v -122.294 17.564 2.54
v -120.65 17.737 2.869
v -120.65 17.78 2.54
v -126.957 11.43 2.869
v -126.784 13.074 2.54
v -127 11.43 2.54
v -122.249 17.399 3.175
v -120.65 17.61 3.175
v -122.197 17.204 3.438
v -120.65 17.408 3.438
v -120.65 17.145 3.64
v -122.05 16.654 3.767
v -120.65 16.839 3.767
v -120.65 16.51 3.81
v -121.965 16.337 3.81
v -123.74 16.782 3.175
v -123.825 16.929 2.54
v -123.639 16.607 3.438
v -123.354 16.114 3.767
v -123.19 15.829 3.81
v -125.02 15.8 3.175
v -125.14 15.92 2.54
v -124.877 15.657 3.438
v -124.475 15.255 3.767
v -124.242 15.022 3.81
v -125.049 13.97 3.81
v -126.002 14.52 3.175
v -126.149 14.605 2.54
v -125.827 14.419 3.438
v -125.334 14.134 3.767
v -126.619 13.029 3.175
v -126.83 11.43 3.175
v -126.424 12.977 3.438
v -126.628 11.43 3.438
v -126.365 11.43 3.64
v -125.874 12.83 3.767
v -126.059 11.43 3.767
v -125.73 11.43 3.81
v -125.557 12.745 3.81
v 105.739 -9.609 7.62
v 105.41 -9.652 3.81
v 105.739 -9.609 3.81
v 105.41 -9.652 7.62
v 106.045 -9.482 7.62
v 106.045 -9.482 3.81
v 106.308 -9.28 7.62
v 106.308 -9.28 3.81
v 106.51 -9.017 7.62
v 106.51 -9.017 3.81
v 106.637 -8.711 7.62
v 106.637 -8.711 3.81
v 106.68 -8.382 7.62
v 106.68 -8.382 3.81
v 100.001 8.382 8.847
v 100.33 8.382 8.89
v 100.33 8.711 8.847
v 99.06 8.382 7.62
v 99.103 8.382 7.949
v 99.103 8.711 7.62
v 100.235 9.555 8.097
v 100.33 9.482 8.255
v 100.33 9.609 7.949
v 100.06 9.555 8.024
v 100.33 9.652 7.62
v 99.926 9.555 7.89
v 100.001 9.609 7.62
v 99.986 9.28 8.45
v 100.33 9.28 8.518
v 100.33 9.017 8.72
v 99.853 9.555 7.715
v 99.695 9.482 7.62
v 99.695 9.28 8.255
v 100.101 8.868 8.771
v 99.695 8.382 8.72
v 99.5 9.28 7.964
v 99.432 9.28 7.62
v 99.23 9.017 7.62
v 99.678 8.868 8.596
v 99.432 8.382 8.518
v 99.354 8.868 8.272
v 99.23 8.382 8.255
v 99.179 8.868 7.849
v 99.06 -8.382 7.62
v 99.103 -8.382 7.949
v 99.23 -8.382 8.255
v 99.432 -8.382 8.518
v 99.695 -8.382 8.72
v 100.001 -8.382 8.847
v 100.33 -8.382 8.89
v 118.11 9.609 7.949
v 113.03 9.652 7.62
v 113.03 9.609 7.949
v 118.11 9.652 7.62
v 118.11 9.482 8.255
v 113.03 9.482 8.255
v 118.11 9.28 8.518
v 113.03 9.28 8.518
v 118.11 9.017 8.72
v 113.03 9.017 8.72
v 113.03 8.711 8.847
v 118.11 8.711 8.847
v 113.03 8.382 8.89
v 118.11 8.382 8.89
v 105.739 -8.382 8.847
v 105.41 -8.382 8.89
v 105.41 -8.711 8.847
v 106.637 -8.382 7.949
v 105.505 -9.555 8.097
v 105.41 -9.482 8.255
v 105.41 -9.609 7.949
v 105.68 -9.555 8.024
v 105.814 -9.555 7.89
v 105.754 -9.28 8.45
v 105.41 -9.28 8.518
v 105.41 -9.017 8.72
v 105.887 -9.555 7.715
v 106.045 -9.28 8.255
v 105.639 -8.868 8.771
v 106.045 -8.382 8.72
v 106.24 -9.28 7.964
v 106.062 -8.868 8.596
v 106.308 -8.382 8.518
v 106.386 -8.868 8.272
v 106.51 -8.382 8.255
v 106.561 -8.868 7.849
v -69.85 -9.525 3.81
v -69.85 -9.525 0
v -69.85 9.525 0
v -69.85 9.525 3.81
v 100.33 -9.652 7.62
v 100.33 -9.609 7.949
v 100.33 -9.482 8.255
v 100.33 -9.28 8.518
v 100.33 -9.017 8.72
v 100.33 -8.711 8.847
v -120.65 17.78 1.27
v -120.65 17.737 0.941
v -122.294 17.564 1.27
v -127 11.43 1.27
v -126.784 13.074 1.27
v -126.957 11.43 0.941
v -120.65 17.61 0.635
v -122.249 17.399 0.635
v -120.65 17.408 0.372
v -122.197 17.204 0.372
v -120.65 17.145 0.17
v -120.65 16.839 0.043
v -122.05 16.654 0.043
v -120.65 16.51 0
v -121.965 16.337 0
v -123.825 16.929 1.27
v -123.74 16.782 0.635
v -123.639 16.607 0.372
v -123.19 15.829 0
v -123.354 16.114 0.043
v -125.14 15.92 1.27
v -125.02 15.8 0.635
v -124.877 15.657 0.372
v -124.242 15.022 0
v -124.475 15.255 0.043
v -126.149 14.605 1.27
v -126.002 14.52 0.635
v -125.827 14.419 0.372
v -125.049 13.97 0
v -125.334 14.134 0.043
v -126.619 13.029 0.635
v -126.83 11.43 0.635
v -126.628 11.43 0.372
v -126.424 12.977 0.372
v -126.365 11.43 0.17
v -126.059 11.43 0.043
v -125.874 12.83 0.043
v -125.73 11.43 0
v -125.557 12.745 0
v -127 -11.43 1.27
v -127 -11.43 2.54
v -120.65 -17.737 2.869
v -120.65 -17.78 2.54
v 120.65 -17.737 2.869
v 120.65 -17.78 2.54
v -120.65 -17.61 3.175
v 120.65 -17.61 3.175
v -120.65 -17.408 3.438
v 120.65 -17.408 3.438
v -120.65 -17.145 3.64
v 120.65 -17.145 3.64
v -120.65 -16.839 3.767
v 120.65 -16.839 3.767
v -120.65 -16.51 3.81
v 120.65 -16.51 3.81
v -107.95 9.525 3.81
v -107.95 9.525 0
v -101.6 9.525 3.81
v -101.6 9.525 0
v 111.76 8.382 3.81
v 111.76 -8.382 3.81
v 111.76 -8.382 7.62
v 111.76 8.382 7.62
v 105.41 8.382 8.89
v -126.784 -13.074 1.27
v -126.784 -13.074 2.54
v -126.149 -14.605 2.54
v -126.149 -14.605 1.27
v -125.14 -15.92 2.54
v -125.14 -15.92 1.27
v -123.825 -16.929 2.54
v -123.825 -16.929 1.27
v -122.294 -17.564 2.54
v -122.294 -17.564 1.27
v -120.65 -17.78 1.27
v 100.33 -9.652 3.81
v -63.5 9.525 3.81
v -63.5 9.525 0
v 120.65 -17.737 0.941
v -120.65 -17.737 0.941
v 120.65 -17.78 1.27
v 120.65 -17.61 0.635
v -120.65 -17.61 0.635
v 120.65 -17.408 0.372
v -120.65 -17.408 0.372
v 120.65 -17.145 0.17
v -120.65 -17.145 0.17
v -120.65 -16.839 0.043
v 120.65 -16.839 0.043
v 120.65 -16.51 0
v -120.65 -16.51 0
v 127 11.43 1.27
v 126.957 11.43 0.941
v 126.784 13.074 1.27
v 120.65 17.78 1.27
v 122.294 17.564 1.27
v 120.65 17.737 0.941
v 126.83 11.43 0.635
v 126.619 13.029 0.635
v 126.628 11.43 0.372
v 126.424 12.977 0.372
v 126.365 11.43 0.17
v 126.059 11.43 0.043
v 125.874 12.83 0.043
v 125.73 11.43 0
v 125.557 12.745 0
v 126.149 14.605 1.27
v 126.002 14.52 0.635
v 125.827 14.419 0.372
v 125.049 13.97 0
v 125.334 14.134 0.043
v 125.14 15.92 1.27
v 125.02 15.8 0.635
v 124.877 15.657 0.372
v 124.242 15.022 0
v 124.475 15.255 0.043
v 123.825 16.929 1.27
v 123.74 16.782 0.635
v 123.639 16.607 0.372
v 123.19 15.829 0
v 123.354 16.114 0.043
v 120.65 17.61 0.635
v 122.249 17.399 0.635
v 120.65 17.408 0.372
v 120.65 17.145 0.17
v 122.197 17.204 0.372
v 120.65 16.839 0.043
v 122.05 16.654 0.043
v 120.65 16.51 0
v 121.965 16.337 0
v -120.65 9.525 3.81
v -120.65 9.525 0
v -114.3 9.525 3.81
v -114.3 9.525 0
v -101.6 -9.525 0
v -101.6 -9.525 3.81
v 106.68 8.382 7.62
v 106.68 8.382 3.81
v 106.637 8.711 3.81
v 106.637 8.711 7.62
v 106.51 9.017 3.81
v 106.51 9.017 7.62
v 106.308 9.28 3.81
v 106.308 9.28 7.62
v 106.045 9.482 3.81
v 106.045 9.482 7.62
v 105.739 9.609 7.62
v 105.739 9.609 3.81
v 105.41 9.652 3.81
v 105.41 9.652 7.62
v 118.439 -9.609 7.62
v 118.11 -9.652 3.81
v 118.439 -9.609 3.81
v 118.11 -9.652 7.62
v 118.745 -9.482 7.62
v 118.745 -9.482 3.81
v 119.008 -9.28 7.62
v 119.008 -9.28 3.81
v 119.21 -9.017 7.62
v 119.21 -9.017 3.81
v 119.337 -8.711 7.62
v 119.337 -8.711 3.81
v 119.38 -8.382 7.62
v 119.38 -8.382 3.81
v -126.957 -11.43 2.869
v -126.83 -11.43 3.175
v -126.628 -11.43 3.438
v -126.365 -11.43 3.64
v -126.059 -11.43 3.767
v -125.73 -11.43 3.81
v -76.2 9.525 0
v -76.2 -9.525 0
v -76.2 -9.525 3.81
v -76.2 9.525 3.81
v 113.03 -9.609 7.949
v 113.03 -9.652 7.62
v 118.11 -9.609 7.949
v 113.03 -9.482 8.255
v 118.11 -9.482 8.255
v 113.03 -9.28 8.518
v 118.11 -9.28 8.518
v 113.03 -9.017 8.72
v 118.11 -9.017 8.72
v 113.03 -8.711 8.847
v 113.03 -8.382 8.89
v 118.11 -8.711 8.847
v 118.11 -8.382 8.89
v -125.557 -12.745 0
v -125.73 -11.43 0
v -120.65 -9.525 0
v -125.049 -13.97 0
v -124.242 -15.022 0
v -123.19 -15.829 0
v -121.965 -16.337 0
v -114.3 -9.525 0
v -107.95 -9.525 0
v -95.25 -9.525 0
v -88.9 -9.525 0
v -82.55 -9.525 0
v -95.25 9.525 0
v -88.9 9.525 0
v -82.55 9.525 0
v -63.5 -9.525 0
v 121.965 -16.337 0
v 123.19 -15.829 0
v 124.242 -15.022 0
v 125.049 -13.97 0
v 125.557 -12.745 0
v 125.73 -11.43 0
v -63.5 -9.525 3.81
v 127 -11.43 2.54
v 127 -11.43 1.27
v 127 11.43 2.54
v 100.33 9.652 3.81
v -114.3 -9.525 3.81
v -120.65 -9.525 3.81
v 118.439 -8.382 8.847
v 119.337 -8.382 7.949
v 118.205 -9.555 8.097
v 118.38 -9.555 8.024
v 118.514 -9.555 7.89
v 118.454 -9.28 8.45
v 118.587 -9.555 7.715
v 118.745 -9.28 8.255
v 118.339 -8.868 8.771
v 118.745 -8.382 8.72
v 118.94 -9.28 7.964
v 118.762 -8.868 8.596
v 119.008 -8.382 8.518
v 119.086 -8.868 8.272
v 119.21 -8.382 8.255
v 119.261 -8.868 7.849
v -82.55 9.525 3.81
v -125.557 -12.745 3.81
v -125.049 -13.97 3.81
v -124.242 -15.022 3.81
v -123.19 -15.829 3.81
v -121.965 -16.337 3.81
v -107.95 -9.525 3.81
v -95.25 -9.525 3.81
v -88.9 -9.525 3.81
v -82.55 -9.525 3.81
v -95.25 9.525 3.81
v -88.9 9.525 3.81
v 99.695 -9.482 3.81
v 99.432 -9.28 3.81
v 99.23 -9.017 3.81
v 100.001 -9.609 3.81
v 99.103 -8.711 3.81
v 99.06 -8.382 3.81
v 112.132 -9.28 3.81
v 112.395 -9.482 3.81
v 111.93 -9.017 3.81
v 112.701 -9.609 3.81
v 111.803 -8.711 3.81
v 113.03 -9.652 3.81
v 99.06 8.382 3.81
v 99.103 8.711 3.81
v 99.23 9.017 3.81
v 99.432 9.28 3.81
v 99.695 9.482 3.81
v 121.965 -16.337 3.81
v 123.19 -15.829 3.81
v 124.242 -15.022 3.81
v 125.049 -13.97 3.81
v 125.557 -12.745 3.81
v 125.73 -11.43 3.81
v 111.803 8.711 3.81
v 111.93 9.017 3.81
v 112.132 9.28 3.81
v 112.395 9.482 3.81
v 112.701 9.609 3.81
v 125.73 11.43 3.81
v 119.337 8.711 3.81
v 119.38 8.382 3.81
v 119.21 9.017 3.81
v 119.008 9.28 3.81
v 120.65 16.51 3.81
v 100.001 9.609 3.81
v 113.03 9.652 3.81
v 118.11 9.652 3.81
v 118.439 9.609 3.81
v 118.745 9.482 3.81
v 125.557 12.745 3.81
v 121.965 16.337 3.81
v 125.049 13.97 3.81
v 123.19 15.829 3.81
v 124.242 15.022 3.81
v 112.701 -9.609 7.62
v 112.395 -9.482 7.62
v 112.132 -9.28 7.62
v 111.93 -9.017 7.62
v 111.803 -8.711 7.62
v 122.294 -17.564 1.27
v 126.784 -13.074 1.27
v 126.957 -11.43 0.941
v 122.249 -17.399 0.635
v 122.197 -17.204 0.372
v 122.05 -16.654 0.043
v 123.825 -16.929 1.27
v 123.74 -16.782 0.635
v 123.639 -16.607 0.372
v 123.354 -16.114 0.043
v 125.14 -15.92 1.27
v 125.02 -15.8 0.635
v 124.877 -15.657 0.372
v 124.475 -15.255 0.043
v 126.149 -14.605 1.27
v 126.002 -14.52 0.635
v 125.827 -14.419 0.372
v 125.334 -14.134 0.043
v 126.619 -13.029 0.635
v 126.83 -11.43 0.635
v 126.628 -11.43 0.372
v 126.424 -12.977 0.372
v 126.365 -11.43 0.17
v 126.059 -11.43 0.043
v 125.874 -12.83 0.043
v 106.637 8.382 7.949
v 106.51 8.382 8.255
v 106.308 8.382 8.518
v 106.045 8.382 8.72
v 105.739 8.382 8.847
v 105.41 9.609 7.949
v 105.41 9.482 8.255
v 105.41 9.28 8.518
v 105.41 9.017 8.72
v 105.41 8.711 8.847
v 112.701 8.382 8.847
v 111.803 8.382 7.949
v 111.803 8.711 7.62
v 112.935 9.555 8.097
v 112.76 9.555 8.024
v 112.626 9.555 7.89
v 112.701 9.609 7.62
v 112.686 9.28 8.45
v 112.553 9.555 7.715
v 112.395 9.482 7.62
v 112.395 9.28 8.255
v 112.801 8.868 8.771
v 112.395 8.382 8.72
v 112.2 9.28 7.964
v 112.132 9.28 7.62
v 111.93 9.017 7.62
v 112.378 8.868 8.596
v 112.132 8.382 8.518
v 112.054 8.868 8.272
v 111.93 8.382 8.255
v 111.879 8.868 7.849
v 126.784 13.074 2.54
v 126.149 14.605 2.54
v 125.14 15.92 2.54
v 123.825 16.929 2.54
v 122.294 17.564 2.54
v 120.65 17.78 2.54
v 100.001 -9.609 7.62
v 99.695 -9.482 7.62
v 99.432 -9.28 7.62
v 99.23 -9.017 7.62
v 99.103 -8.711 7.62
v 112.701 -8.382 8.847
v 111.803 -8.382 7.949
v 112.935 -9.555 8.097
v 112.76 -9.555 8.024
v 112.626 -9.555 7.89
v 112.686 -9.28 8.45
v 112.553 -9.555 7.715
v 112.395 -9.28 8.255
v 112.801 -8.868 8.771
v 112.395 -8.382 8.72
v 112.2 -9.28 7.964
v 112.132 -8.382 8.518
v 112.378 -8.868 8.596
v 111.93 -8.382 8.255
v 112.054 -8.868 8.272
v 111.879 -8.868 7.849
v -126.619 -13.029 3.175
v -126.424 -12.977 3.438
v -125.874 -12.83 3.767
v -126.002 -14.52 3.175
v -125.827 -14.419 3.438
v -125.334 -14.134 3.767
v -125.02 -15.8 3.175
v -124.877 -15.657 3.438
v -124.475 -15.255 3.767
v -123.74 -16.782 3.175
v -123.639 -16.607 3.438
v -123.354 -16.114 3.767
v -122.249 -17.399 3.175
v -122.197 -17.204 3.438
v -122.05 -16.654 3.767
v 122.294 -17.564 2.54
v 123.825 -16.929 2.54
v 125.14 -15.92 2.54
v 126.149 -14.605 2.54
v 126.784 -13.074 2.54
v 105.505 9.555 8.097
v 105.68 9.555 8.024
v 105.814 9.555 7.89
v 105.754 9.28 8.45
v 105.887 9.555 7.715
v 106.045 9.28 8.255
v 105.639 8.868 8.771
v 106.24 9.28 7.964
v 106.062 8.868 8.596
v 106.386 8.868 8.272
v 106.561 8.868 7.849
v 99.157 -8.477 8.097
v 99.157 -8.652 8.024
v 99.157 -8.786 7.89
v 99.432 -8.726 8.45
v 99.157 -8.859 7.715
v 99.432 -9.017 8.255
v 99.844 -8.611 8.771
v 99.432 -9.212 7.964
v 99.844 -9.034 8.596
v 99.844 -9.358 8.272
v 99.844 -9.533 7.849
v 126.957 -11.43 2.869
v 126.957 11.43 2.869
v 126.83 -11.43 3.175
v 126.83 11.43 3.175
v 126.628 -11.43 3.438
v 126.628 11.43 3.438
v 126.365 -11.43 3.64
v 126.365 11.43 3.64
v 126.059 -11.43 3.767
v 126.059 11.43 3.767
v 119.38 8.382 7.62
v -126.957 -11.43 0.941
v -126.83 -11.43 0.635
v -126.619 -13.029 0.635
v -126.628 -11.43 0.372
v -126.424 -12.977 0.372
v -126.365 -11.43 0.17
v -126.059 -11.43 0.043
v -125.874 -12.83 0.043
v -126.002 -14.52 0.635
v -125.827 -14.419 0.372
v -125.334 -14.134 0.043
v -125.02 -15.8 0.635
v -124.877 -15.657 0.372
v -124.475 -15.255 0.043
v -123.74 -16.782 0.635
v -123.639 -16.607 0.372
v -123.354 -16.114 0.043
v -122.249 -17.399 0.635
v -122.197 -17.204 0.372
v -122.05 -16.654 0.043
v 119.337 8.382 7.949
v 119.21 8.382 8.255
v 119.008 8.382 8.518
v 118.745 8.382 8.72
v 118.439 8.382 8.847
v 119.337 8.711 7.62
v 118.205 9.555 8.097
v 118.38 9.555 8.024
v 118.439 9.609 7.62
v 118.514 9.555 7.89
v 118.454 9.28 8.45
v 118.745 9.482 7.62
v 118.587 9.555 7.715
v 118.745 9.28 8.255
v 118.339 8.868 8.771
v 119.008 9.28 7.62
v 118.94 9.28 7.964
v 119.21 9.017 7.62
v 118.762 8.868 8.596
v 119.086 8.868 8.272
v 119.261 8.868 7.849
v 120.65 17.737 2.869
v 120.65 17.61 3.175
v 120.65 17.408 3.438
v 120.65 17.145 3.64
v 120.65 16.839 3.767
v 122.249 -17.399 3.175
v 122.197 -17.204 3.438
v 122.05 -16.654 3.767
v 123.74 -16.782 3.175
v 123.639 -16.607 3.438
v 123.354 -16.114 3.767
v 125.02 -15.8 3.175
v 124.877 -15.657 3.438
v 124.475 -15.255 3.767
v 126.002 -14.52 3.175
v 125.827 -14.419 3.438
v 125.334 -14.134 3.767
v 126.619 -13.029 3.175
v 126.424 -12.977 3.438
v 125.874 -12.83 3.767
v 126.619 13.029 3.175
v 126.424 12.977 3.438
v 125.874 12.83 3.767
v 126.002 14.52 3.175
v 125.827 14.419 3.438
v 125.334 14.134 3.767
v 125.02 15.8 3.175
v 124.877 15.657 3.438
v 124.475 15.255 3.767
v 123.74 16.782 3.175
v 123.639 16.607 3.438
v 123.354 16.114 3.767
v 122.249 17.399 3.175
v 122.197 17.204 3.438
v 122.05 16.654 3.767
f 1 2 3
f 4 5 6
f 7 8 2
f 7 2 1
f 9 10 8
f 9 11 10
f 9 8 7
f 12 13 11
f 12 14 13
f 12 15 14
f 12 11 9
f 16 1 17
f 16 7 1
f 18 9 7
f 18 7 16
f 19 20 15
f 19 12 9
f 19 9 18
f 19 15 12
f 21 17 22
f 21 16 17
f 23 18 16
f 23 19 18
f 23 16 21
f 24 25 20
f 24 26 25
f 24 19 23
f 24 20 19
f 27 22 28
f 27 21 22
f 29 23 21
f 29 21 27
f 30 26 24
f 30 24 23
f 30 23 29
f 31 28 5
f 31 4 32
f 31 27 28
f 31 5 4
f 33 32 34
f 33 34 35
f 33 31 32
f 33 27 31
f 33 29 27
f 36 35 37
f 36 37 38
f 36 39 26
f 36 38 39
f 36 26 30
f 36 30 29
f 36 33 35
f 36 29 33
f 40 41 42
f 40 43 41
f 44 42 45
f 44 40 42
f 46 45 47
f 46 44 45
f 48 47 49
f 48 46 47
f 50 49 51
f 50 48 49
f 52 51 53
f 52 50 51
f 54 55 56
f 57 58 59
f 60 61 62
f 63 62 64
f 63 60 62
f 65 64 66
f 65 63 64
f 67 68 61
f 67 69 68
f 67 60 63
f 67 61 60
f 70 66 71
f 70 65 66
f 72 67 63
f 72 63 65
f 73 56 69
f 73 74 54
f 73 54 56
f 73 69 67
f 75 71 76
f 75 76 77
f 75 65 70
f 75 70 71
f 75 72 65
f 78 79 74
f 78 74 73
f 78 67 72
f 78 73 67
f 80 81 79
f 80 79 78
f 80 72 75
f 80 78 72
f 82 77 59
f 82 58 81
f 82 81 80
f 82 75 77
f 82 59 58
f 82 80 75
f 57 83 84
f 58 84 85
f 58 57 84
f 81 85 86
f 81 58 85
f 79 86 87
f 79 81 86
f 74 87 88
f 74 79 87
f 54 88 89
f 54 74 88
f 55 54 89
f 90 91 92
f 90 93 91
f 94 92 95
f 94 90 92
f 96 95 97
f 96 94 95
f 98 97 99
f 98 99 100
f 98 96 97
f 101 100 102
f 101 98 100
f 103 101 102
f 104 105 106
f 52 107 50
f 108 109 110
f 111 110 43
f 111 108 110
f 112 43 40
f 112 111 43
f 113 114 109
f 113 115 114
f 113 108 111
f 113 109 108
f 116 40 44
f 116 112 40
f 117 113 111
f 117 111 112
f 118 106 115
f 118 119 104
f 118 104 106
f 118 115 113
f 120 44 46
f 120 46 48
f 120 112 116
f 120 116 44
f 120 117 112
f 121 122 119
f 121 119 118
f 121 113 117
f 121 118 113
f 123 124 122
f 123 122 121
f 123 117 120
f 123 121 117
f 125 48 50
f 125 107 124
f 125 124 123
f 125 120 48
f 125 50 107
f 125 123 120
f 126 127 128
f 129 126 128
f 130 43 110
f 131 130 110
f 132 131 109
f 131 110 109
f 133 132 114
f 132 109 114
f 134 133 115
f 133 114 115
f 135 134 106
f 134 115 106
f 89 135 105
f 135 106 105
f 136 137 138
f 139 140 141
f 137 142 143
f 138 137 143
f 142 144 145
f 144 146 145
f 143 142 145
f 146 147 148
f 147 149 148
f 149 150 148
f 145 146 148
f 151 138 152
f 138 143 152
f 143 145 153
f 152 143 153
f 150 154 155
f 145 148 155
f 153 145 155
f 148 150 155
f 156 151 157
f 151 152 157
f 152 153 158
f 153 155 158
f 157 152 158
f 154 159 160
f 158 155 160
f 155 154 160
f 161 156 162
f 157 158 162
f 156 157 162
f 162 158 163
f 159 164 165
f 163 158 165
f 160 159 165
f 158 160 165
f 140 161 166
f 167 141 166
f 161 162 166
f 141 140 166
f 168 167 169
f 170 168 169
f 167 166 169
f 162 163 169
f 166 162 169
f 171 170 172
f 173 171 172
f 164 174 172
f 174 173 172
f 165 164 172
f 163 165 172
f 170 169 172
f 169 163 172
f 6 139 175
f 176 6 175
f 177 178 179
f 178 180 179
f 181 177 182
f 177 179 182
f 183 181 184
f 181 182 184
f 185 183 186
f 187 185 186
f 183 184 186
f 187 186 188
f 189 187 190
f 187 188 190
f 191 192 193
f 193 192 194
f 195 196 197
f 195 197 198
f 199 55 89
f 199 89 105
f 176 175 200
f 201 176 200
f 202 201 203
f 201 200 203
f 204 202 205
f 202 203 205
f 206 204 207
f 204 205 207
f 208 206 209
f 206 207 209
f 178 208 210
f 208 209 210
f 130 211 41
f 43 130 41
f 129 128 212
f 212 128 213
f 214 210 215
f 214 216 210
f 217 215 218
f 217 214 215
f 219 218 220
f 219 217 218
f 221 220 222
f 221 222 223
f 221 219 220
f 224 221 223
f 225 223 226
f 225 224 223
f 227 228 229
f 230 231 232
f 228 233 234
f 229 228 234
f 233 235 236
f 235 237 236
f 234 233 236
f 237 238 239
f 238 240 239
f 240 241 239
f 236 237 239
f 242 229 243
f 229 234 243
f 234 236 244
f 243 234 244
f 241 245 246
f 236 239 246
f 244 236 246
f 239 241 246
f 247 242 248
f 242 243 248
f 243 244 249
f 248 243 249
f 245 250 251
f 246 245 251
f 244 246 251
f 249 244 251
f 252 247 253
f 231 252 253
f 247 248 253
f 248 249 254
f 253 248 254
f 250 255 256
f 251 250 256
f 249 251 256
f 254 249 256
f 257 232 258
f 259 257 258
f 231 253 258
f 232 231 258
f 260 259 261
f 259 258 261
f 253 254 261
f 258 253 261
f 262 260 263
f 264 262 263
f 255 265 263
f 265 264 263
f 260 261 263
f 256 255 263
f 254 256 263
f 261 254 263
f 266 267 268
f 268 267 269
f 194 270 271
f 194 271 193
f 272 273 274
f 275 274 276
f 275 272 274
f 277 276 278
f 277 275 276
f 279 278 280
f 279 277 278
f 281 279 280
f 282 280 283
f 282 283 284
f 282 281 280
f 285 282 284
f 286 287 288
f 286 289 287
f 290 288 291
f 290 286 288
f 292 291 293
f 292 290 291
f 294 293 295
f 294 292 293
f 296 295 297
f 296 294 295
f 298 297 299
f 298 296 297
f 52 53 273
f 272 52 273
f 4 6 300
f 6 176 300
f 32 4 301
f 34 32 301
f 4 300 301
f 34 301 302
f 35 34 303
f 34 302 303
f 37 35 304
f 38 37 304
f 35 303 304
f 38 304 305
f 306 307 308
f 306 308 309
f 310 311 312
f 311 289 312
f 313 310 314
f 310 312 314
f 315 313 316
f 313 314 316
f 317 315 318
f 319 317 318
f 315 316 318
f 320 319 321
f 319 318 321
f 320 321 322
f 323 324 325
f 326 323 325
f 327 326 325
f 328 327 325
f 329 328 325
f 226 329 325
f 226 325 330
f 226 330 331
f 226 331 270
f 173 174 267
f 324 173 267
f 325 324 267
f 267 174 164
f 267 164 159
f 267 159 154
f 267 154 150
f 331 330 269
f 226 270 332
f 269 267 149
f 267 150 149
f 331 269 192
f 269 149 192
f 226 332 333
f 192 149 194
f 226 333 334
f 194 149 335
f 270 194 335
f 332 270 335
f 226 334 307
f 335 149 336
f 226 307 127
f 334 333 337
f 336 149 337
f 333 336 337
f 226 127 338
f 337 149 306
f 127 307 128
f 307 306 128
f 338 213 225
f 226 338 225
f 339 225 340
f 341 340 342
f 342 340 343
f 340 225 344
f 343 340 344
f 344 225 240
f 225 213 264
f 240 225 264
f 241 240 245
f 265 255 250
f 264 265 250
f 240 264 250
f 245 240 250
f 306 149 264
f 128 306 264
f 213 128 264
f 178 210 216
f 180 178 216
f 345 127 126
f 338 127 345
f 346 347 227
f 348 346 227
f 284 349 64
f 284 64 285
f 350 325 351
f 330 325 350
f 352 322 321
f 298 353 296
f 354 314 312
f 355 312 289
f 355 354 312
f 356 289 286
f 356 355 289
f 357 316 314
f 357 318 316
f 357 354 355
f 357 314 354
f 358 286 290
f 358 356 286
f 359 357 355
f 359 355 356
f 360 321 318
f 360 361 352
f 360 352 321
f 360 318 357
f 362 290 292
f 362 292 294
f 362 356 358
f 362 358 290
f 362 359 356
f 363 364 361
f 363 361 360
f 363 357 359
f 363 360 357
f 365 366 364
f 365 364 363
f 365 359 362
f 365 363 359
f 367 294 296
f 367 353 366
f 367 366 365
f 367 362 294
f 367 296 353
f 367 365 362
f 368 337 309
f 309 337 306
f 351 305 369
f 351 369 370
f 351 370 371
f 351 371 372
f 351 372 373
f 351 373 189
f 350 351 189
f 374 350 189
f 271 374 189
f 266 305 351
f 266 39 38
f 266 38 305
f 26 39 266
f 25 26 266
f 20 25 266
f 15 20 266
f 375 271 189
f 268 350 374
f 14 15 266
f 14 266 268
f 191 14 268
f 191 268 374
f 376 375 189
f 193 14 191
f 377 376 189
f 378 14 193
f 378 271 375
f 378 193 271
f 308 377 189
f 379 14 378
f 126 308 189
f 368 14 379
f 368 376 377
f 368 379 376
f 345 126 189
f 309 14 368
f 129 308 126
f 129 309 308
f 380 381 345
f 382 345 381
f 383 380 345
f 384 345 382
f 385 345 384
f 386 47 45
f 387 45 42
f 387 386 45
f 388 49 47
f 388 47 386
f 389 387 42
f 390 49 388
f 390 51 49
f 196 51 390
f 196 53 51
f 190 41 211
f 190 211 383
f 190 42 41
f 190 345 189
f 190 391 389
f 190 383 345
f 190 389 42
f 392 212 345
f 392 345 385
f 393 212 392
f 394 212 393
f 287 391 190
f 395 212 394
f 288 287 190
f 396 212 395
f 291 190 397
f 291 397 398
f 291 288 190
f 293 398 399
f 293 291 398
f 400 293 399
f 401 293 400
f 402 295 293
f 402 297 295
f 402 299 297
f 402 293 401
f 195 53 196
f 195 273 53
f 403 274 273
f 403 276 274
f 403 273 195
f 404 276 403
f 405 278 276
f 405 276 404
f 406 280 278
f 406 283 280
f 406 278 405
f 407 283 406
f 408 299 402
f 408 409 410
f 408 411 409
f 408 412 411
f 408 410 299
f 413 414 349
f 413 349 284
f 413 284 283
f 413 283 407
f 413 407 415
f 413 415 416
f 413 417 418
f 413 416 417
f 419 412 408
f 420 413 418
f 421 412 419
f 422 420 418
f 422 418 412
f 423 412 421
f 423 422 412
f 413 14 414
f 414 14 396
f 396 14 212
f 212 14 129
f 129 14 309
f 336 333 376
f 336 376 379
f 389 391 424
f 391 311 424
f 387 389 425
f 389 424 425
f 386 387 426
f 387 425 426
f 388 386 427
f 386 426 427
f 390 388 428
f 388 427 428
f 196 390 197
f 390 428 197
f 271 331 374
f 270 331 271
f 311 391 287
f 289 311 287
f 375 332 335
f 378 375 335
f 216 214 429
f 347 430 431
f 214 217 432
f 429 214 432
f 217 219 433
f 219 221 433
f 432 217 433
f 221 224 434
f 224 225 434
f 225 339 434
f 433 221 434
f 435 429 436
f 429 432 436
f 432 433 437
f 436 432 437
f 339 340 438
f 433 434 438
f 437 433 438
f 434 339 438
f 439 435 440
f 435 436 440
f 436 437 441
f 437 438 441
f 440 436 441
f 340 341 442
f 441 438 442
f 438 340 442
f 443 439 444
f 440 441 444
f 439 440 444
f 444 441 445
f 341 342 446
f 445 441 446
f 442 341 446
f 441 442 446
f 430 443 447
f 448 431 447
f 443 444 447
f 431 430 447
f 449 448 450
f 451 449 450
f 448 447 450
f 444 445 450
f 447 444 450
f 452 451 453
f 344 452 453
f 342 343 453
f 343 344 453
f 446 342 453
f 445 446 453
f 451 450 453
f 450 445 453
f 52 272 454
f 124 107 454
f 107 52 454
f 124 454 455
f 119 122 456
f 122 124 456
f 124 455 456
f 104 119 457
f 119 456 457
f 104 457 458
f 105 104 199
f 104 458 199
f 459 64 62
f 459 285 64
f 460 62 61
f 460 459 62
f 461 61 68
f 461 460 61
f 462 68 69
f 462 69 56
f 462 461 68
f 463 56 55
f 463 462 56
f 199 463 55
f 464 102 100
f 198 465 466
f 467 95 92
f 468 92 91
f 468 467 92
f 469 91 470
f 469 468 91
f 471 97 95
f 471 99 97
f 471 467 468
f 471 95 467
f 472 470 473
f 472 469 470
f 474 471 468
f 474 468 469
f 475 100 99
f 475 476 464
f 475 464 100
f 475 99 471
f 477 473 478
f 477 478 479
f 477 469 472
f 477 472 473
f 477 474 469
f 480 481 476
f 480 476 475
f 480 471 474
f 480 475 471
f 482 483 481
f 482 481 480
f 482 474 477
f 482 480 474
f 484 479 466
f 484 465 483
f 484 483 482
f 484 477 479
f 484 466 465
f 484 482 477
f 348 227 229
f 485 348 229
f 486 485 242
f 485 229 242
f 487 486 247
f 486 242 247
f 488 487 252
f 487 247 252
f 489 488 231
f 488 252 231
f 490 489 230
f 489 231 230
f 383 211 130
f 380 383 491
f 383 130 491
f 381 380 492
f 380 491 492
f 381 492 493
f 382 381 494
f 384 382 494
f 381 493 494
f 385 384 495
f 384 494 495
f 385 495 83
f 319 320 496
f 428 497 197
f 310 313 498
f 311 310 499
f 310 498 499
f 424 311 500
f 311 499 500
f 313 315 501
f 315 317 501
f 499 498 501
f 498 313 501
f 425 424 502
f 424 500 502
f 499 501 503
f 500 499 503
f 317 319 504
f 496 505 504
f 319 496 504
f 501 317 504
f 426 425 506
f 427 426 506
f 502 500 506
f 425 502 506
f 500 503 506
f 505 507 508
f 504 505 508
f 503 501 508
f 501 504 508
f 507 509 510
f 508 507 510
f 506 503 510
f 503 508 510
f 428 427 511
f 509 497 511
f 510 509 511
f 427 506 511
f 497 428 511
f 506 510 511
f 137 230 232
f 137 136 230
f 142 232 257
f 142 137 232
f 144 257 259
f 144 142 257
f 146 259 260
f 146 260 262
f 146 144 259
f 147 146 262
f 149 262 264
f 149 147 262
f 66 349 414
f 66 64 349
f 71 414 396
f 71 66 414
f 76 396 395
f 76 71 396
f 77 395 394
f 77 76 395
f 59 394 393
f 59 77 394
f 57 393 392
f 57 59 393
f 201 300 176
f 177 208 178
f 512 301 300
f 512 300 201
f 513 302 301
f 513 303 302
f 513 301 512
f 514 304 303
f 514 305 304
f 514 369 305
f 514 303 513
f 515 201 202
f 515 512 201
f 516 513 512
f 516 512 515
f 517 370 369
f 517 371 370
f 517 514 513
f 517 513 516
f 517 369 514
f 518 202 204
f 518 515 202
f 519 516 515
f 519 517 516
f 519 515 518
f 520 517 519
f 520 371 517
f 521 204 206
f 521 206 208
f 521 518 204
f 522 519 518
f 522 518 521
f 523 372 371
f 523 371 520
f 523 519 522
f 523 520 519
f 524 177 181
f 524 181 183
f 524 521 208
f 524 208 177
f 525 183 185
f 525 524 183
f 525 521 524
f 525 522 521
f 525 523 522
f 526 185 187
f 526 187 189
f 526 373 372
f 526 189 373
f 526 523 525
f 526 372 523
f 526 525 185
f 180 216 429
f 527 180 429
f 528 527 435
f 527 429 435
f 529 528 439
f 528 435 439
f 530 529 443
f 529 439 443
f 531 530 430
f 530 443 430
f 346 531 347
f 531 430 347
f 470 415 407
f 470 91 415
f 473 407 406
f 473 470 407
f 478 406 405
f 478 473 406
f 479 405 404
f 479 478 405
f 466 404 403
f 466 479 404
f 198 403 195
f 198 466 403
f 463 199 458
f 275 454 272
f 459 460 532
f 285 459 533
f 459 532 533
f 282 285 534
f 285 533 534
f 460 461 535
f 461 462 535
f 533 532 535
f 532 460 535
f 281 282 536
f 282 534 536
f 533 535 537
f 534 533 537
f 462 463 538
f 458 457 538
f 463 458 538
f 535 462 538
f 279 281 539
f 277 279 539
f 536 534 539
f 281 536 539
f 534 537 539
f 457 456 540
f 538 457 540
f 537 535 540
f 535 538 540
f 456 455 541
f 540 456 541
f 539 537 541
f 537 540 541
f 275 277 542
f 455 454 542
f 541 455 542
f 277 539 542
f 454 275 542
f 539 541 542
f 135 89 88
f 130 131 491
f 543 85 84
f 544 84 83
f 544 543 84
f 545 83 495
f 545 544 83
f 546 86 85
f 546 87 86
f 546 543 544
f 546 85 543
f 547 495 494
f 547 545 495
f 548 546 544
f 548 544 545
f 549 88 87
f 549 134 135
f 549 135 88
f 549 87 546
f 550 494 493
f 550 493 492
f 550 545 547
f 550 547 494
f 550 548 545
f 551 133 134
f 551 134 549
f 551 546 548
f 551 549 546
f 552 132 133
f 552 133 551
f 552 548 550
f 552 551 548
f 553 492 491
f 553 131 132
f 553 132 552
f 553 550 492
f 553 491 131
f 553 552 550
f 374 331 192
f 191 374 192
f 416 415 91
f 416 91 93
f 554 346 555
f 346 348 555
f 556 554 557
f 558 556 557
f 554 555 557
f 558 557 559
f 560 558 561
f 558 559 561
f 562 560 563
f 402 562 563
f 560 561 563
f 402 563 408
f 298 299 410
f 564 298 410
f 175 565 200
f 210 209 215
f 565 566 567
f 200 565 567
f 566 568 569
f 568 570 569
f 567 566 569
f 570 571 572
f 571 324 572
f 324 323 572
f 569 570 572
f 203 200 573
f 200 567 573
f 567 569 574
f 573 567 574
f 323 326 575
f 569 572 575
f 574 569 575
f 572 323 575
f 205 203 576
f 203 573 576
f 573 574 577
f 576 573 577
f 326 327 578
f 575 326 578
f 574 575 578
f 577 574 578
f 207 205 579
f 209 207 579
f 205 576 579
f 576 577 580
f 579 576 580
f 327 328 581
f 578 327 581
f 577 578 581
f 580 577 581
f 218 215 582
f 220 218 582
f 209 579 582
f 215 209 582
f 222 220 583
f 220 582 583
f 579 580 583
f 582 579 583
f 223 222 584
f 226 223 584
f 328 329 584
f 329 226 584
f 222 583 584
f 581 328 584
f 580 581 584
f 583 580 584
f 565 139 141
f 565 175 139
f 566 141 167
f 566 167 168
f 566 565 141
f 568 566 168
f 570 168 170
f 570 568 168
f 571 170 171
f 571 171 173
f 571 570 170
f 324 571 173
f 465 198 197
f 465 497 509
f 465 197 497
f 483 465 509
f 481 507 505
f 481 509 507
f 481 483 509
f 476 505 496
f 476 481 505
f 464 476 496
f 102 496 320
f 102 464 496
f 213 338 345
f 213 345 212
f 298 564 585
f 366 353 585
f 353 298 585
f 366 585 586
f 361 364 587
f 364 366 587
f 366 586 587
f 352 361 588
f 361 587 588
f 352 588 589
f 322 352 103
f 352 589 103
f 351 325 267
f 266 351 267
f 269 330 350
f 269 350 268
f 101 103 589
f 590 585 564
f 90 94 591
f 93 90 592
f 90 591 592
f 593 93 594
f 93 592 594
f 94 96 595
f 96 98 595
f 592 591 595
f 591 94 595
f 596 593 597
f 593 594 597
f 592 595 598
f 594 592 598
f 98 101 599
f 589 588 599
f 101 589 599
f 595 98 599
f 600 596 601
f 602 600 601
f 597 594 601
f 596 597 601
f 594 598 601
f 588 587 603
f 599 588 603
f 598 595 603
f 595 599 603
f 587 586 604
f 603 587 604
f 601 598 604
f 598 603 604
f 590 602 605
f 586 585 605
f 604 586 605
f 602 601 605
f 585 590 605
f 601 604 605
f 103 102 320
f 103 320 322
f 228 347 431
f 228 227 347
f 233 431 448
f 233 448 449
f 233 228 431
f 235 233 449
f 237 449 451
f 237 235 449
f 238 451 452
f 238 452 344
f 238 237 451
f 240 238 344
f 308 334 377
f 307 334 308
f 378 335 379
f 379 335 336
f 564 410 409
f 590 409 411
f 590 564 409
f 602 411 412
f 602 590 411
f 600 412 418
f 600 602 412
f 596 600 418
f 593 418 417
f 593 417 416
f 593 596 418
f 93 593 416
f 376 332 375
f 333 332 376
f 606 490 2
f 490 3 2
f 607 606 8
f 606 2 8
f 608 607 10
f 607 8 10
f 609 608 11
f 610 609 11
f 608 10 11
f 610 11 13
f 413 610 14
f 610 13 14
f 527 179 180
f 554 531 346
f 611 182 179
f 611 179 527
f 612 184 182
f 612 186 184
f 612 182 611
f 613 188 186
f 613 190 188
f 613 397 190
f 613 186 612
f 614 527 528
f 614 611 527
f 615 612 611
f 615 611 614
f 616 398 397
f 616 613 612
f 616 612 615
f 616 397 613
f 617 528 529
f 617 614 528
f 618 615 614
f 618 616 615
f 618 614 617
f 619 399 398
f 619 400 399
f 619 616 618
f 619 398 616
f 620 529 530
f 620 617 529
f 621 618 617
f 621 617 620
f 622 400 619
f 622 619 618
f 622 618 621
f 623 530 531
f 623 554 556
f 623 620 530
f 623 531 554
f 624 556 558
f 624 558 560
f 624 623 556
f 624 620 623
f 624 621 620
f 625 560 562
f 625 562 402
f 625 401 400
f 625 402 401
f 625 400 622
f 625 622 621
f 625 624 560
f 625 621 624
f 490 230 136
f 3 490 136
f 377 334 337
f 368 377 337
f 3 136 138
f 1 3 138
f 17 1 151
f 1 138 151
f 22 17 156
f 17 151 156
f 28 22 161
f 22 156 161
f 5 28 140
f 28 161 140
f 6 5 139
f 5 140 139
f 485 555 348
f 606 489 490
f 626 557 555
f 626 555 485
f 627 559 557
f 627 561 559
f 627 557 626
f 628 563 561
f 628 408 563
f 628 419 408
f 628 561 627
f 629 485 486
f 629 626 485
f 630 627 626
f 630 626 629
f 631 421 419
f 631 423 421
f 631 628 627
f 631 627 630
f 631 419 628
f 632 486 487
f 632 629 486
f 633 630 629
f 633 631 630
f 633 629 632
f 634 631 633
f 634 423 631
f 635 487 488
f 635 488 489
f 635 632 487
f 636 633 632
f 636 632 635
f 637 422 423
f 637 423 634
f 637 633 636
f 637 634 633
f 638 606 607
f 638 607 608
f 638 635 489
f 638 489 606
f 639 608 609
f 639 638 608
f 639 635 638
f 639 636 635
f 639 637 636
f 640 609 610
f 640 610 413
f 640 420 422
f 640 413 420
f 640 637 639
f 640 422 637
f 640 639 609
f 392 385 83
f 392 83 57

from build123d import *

# Parameters (mm, degrees)
F0_W     = 6.35
F0_H     = 19.05
F0_R     = 17.5576306553
F1_DEPTH = 3.81
F2_R     = 1.27
F3_W     = 7.62
F3_H     = 19.304
F4_DEPTH = 5.08
F5_R     = 1.27


# Not quite as in the source:
# - a feature names something its author has since deleted; it is built from what else it names


with BuildPart() as f1:
    # F0 (on Top) → F1 (new body)
    with BuildSketch(Plane.XY):
        with BuildLine():
            ThreePointArc((127, 11.43), (125.1401280605, 15.9201280605), (120.65, 17.78))
            Line((120.65, 17.78), (-120.65, 17.78))
            ThreePointArc((-120.65, 17.78), (-125.1401280605, 15.9201280605), (-127, 11.43))
            Line((-127, 11.43), (-127, -11.43))
            ThreePointArc((-127, -11.43), (-125.1401280605, -15.9201280605), (-120.65, -17.78))
            Line((-120.65, -17.78), (120.65, -17.78))
            ThreePointArc((120.65, -17.78), (125.1401280605, -15.9201280605), (127, -11.43))
            Line((127, -11.43), (127, 11.43))
        make_face()
        with Locations((-117.475, 0)):
            Rectangle(F0_W, F0_H, mode=Mode.SUBTRACT)
        with Locations((-104.775, 0)):
            Rectangle(F0_W, F0_H, mode=Mode.SUBTRACT)
        with Locations((-92.075, 0)):
            Rectangle(F0_W, F0_H, mode=Mode.SUBTRACT)
        with Locations((-79.375, 0)):
            Rectangle(F0_W, F0_H, mode=Mode.SUBTRACT)
        with Locations((-66.675, 0)):
            Rectangle(F0_W, F0_H, mode=Mode.SUBTRACT)
        with Locations((4.1378471069, 0)):
            Circle(F0_R, mode=Mode.SUBTRACT)
        with Locations((4.1378471069, 0)):
            Circle(F0_R)
    extrude(amount=F1_DEPTH)

    # F2
    f2_edges = [f1.edges().sort_by_distance(p)[0] for p in [
        (0, -17.78, 0),
        (0, -17.78, 3.81),
    ]]
    fillet(f2_edges, radius=F2_R)

    # F3 (on face) → F4 (join)
    with BuildSketch(Plane.XY.offset(3.81)):
        with Locations((102.87, 0)):
            Rectangle(F3_W, F3_H)
        with Locations((115.57, 0)):
            Rectangle(F3_W, F3_H)
    extrude(amount=F4_DEPTH)

    # F5
    f5_edges = [f1.edges().sort_by_distance(p)[0] for p in [
        (106.68, 0, 8.89),
        (102.87, -9.652, 8.89),
        (99.06, 0, 8.89),
        (102.87, 9.652, 8.89),
        (111.76, 0, 8.89),
        (119.38, 0, 8.89),
        (115.57, -9.652, 8.89),
        (115.57, 9.652, 8.89),
        (119.38, -9.652, 6.35),
        (111.76, -9.652, 6.35),
        (106.68, -9.652, 6.35),
        (99.06, -9.652, 6.35),
        (106.68, 9.652, 6.35),
        (119.38, 9.652, 6.35),
        (111.76, 9.652, 6.35),
        (99.06, 9.652, 6.35),
    ]]
    fillet(f5_edges, radius=F5_R)


solid = f1.part
